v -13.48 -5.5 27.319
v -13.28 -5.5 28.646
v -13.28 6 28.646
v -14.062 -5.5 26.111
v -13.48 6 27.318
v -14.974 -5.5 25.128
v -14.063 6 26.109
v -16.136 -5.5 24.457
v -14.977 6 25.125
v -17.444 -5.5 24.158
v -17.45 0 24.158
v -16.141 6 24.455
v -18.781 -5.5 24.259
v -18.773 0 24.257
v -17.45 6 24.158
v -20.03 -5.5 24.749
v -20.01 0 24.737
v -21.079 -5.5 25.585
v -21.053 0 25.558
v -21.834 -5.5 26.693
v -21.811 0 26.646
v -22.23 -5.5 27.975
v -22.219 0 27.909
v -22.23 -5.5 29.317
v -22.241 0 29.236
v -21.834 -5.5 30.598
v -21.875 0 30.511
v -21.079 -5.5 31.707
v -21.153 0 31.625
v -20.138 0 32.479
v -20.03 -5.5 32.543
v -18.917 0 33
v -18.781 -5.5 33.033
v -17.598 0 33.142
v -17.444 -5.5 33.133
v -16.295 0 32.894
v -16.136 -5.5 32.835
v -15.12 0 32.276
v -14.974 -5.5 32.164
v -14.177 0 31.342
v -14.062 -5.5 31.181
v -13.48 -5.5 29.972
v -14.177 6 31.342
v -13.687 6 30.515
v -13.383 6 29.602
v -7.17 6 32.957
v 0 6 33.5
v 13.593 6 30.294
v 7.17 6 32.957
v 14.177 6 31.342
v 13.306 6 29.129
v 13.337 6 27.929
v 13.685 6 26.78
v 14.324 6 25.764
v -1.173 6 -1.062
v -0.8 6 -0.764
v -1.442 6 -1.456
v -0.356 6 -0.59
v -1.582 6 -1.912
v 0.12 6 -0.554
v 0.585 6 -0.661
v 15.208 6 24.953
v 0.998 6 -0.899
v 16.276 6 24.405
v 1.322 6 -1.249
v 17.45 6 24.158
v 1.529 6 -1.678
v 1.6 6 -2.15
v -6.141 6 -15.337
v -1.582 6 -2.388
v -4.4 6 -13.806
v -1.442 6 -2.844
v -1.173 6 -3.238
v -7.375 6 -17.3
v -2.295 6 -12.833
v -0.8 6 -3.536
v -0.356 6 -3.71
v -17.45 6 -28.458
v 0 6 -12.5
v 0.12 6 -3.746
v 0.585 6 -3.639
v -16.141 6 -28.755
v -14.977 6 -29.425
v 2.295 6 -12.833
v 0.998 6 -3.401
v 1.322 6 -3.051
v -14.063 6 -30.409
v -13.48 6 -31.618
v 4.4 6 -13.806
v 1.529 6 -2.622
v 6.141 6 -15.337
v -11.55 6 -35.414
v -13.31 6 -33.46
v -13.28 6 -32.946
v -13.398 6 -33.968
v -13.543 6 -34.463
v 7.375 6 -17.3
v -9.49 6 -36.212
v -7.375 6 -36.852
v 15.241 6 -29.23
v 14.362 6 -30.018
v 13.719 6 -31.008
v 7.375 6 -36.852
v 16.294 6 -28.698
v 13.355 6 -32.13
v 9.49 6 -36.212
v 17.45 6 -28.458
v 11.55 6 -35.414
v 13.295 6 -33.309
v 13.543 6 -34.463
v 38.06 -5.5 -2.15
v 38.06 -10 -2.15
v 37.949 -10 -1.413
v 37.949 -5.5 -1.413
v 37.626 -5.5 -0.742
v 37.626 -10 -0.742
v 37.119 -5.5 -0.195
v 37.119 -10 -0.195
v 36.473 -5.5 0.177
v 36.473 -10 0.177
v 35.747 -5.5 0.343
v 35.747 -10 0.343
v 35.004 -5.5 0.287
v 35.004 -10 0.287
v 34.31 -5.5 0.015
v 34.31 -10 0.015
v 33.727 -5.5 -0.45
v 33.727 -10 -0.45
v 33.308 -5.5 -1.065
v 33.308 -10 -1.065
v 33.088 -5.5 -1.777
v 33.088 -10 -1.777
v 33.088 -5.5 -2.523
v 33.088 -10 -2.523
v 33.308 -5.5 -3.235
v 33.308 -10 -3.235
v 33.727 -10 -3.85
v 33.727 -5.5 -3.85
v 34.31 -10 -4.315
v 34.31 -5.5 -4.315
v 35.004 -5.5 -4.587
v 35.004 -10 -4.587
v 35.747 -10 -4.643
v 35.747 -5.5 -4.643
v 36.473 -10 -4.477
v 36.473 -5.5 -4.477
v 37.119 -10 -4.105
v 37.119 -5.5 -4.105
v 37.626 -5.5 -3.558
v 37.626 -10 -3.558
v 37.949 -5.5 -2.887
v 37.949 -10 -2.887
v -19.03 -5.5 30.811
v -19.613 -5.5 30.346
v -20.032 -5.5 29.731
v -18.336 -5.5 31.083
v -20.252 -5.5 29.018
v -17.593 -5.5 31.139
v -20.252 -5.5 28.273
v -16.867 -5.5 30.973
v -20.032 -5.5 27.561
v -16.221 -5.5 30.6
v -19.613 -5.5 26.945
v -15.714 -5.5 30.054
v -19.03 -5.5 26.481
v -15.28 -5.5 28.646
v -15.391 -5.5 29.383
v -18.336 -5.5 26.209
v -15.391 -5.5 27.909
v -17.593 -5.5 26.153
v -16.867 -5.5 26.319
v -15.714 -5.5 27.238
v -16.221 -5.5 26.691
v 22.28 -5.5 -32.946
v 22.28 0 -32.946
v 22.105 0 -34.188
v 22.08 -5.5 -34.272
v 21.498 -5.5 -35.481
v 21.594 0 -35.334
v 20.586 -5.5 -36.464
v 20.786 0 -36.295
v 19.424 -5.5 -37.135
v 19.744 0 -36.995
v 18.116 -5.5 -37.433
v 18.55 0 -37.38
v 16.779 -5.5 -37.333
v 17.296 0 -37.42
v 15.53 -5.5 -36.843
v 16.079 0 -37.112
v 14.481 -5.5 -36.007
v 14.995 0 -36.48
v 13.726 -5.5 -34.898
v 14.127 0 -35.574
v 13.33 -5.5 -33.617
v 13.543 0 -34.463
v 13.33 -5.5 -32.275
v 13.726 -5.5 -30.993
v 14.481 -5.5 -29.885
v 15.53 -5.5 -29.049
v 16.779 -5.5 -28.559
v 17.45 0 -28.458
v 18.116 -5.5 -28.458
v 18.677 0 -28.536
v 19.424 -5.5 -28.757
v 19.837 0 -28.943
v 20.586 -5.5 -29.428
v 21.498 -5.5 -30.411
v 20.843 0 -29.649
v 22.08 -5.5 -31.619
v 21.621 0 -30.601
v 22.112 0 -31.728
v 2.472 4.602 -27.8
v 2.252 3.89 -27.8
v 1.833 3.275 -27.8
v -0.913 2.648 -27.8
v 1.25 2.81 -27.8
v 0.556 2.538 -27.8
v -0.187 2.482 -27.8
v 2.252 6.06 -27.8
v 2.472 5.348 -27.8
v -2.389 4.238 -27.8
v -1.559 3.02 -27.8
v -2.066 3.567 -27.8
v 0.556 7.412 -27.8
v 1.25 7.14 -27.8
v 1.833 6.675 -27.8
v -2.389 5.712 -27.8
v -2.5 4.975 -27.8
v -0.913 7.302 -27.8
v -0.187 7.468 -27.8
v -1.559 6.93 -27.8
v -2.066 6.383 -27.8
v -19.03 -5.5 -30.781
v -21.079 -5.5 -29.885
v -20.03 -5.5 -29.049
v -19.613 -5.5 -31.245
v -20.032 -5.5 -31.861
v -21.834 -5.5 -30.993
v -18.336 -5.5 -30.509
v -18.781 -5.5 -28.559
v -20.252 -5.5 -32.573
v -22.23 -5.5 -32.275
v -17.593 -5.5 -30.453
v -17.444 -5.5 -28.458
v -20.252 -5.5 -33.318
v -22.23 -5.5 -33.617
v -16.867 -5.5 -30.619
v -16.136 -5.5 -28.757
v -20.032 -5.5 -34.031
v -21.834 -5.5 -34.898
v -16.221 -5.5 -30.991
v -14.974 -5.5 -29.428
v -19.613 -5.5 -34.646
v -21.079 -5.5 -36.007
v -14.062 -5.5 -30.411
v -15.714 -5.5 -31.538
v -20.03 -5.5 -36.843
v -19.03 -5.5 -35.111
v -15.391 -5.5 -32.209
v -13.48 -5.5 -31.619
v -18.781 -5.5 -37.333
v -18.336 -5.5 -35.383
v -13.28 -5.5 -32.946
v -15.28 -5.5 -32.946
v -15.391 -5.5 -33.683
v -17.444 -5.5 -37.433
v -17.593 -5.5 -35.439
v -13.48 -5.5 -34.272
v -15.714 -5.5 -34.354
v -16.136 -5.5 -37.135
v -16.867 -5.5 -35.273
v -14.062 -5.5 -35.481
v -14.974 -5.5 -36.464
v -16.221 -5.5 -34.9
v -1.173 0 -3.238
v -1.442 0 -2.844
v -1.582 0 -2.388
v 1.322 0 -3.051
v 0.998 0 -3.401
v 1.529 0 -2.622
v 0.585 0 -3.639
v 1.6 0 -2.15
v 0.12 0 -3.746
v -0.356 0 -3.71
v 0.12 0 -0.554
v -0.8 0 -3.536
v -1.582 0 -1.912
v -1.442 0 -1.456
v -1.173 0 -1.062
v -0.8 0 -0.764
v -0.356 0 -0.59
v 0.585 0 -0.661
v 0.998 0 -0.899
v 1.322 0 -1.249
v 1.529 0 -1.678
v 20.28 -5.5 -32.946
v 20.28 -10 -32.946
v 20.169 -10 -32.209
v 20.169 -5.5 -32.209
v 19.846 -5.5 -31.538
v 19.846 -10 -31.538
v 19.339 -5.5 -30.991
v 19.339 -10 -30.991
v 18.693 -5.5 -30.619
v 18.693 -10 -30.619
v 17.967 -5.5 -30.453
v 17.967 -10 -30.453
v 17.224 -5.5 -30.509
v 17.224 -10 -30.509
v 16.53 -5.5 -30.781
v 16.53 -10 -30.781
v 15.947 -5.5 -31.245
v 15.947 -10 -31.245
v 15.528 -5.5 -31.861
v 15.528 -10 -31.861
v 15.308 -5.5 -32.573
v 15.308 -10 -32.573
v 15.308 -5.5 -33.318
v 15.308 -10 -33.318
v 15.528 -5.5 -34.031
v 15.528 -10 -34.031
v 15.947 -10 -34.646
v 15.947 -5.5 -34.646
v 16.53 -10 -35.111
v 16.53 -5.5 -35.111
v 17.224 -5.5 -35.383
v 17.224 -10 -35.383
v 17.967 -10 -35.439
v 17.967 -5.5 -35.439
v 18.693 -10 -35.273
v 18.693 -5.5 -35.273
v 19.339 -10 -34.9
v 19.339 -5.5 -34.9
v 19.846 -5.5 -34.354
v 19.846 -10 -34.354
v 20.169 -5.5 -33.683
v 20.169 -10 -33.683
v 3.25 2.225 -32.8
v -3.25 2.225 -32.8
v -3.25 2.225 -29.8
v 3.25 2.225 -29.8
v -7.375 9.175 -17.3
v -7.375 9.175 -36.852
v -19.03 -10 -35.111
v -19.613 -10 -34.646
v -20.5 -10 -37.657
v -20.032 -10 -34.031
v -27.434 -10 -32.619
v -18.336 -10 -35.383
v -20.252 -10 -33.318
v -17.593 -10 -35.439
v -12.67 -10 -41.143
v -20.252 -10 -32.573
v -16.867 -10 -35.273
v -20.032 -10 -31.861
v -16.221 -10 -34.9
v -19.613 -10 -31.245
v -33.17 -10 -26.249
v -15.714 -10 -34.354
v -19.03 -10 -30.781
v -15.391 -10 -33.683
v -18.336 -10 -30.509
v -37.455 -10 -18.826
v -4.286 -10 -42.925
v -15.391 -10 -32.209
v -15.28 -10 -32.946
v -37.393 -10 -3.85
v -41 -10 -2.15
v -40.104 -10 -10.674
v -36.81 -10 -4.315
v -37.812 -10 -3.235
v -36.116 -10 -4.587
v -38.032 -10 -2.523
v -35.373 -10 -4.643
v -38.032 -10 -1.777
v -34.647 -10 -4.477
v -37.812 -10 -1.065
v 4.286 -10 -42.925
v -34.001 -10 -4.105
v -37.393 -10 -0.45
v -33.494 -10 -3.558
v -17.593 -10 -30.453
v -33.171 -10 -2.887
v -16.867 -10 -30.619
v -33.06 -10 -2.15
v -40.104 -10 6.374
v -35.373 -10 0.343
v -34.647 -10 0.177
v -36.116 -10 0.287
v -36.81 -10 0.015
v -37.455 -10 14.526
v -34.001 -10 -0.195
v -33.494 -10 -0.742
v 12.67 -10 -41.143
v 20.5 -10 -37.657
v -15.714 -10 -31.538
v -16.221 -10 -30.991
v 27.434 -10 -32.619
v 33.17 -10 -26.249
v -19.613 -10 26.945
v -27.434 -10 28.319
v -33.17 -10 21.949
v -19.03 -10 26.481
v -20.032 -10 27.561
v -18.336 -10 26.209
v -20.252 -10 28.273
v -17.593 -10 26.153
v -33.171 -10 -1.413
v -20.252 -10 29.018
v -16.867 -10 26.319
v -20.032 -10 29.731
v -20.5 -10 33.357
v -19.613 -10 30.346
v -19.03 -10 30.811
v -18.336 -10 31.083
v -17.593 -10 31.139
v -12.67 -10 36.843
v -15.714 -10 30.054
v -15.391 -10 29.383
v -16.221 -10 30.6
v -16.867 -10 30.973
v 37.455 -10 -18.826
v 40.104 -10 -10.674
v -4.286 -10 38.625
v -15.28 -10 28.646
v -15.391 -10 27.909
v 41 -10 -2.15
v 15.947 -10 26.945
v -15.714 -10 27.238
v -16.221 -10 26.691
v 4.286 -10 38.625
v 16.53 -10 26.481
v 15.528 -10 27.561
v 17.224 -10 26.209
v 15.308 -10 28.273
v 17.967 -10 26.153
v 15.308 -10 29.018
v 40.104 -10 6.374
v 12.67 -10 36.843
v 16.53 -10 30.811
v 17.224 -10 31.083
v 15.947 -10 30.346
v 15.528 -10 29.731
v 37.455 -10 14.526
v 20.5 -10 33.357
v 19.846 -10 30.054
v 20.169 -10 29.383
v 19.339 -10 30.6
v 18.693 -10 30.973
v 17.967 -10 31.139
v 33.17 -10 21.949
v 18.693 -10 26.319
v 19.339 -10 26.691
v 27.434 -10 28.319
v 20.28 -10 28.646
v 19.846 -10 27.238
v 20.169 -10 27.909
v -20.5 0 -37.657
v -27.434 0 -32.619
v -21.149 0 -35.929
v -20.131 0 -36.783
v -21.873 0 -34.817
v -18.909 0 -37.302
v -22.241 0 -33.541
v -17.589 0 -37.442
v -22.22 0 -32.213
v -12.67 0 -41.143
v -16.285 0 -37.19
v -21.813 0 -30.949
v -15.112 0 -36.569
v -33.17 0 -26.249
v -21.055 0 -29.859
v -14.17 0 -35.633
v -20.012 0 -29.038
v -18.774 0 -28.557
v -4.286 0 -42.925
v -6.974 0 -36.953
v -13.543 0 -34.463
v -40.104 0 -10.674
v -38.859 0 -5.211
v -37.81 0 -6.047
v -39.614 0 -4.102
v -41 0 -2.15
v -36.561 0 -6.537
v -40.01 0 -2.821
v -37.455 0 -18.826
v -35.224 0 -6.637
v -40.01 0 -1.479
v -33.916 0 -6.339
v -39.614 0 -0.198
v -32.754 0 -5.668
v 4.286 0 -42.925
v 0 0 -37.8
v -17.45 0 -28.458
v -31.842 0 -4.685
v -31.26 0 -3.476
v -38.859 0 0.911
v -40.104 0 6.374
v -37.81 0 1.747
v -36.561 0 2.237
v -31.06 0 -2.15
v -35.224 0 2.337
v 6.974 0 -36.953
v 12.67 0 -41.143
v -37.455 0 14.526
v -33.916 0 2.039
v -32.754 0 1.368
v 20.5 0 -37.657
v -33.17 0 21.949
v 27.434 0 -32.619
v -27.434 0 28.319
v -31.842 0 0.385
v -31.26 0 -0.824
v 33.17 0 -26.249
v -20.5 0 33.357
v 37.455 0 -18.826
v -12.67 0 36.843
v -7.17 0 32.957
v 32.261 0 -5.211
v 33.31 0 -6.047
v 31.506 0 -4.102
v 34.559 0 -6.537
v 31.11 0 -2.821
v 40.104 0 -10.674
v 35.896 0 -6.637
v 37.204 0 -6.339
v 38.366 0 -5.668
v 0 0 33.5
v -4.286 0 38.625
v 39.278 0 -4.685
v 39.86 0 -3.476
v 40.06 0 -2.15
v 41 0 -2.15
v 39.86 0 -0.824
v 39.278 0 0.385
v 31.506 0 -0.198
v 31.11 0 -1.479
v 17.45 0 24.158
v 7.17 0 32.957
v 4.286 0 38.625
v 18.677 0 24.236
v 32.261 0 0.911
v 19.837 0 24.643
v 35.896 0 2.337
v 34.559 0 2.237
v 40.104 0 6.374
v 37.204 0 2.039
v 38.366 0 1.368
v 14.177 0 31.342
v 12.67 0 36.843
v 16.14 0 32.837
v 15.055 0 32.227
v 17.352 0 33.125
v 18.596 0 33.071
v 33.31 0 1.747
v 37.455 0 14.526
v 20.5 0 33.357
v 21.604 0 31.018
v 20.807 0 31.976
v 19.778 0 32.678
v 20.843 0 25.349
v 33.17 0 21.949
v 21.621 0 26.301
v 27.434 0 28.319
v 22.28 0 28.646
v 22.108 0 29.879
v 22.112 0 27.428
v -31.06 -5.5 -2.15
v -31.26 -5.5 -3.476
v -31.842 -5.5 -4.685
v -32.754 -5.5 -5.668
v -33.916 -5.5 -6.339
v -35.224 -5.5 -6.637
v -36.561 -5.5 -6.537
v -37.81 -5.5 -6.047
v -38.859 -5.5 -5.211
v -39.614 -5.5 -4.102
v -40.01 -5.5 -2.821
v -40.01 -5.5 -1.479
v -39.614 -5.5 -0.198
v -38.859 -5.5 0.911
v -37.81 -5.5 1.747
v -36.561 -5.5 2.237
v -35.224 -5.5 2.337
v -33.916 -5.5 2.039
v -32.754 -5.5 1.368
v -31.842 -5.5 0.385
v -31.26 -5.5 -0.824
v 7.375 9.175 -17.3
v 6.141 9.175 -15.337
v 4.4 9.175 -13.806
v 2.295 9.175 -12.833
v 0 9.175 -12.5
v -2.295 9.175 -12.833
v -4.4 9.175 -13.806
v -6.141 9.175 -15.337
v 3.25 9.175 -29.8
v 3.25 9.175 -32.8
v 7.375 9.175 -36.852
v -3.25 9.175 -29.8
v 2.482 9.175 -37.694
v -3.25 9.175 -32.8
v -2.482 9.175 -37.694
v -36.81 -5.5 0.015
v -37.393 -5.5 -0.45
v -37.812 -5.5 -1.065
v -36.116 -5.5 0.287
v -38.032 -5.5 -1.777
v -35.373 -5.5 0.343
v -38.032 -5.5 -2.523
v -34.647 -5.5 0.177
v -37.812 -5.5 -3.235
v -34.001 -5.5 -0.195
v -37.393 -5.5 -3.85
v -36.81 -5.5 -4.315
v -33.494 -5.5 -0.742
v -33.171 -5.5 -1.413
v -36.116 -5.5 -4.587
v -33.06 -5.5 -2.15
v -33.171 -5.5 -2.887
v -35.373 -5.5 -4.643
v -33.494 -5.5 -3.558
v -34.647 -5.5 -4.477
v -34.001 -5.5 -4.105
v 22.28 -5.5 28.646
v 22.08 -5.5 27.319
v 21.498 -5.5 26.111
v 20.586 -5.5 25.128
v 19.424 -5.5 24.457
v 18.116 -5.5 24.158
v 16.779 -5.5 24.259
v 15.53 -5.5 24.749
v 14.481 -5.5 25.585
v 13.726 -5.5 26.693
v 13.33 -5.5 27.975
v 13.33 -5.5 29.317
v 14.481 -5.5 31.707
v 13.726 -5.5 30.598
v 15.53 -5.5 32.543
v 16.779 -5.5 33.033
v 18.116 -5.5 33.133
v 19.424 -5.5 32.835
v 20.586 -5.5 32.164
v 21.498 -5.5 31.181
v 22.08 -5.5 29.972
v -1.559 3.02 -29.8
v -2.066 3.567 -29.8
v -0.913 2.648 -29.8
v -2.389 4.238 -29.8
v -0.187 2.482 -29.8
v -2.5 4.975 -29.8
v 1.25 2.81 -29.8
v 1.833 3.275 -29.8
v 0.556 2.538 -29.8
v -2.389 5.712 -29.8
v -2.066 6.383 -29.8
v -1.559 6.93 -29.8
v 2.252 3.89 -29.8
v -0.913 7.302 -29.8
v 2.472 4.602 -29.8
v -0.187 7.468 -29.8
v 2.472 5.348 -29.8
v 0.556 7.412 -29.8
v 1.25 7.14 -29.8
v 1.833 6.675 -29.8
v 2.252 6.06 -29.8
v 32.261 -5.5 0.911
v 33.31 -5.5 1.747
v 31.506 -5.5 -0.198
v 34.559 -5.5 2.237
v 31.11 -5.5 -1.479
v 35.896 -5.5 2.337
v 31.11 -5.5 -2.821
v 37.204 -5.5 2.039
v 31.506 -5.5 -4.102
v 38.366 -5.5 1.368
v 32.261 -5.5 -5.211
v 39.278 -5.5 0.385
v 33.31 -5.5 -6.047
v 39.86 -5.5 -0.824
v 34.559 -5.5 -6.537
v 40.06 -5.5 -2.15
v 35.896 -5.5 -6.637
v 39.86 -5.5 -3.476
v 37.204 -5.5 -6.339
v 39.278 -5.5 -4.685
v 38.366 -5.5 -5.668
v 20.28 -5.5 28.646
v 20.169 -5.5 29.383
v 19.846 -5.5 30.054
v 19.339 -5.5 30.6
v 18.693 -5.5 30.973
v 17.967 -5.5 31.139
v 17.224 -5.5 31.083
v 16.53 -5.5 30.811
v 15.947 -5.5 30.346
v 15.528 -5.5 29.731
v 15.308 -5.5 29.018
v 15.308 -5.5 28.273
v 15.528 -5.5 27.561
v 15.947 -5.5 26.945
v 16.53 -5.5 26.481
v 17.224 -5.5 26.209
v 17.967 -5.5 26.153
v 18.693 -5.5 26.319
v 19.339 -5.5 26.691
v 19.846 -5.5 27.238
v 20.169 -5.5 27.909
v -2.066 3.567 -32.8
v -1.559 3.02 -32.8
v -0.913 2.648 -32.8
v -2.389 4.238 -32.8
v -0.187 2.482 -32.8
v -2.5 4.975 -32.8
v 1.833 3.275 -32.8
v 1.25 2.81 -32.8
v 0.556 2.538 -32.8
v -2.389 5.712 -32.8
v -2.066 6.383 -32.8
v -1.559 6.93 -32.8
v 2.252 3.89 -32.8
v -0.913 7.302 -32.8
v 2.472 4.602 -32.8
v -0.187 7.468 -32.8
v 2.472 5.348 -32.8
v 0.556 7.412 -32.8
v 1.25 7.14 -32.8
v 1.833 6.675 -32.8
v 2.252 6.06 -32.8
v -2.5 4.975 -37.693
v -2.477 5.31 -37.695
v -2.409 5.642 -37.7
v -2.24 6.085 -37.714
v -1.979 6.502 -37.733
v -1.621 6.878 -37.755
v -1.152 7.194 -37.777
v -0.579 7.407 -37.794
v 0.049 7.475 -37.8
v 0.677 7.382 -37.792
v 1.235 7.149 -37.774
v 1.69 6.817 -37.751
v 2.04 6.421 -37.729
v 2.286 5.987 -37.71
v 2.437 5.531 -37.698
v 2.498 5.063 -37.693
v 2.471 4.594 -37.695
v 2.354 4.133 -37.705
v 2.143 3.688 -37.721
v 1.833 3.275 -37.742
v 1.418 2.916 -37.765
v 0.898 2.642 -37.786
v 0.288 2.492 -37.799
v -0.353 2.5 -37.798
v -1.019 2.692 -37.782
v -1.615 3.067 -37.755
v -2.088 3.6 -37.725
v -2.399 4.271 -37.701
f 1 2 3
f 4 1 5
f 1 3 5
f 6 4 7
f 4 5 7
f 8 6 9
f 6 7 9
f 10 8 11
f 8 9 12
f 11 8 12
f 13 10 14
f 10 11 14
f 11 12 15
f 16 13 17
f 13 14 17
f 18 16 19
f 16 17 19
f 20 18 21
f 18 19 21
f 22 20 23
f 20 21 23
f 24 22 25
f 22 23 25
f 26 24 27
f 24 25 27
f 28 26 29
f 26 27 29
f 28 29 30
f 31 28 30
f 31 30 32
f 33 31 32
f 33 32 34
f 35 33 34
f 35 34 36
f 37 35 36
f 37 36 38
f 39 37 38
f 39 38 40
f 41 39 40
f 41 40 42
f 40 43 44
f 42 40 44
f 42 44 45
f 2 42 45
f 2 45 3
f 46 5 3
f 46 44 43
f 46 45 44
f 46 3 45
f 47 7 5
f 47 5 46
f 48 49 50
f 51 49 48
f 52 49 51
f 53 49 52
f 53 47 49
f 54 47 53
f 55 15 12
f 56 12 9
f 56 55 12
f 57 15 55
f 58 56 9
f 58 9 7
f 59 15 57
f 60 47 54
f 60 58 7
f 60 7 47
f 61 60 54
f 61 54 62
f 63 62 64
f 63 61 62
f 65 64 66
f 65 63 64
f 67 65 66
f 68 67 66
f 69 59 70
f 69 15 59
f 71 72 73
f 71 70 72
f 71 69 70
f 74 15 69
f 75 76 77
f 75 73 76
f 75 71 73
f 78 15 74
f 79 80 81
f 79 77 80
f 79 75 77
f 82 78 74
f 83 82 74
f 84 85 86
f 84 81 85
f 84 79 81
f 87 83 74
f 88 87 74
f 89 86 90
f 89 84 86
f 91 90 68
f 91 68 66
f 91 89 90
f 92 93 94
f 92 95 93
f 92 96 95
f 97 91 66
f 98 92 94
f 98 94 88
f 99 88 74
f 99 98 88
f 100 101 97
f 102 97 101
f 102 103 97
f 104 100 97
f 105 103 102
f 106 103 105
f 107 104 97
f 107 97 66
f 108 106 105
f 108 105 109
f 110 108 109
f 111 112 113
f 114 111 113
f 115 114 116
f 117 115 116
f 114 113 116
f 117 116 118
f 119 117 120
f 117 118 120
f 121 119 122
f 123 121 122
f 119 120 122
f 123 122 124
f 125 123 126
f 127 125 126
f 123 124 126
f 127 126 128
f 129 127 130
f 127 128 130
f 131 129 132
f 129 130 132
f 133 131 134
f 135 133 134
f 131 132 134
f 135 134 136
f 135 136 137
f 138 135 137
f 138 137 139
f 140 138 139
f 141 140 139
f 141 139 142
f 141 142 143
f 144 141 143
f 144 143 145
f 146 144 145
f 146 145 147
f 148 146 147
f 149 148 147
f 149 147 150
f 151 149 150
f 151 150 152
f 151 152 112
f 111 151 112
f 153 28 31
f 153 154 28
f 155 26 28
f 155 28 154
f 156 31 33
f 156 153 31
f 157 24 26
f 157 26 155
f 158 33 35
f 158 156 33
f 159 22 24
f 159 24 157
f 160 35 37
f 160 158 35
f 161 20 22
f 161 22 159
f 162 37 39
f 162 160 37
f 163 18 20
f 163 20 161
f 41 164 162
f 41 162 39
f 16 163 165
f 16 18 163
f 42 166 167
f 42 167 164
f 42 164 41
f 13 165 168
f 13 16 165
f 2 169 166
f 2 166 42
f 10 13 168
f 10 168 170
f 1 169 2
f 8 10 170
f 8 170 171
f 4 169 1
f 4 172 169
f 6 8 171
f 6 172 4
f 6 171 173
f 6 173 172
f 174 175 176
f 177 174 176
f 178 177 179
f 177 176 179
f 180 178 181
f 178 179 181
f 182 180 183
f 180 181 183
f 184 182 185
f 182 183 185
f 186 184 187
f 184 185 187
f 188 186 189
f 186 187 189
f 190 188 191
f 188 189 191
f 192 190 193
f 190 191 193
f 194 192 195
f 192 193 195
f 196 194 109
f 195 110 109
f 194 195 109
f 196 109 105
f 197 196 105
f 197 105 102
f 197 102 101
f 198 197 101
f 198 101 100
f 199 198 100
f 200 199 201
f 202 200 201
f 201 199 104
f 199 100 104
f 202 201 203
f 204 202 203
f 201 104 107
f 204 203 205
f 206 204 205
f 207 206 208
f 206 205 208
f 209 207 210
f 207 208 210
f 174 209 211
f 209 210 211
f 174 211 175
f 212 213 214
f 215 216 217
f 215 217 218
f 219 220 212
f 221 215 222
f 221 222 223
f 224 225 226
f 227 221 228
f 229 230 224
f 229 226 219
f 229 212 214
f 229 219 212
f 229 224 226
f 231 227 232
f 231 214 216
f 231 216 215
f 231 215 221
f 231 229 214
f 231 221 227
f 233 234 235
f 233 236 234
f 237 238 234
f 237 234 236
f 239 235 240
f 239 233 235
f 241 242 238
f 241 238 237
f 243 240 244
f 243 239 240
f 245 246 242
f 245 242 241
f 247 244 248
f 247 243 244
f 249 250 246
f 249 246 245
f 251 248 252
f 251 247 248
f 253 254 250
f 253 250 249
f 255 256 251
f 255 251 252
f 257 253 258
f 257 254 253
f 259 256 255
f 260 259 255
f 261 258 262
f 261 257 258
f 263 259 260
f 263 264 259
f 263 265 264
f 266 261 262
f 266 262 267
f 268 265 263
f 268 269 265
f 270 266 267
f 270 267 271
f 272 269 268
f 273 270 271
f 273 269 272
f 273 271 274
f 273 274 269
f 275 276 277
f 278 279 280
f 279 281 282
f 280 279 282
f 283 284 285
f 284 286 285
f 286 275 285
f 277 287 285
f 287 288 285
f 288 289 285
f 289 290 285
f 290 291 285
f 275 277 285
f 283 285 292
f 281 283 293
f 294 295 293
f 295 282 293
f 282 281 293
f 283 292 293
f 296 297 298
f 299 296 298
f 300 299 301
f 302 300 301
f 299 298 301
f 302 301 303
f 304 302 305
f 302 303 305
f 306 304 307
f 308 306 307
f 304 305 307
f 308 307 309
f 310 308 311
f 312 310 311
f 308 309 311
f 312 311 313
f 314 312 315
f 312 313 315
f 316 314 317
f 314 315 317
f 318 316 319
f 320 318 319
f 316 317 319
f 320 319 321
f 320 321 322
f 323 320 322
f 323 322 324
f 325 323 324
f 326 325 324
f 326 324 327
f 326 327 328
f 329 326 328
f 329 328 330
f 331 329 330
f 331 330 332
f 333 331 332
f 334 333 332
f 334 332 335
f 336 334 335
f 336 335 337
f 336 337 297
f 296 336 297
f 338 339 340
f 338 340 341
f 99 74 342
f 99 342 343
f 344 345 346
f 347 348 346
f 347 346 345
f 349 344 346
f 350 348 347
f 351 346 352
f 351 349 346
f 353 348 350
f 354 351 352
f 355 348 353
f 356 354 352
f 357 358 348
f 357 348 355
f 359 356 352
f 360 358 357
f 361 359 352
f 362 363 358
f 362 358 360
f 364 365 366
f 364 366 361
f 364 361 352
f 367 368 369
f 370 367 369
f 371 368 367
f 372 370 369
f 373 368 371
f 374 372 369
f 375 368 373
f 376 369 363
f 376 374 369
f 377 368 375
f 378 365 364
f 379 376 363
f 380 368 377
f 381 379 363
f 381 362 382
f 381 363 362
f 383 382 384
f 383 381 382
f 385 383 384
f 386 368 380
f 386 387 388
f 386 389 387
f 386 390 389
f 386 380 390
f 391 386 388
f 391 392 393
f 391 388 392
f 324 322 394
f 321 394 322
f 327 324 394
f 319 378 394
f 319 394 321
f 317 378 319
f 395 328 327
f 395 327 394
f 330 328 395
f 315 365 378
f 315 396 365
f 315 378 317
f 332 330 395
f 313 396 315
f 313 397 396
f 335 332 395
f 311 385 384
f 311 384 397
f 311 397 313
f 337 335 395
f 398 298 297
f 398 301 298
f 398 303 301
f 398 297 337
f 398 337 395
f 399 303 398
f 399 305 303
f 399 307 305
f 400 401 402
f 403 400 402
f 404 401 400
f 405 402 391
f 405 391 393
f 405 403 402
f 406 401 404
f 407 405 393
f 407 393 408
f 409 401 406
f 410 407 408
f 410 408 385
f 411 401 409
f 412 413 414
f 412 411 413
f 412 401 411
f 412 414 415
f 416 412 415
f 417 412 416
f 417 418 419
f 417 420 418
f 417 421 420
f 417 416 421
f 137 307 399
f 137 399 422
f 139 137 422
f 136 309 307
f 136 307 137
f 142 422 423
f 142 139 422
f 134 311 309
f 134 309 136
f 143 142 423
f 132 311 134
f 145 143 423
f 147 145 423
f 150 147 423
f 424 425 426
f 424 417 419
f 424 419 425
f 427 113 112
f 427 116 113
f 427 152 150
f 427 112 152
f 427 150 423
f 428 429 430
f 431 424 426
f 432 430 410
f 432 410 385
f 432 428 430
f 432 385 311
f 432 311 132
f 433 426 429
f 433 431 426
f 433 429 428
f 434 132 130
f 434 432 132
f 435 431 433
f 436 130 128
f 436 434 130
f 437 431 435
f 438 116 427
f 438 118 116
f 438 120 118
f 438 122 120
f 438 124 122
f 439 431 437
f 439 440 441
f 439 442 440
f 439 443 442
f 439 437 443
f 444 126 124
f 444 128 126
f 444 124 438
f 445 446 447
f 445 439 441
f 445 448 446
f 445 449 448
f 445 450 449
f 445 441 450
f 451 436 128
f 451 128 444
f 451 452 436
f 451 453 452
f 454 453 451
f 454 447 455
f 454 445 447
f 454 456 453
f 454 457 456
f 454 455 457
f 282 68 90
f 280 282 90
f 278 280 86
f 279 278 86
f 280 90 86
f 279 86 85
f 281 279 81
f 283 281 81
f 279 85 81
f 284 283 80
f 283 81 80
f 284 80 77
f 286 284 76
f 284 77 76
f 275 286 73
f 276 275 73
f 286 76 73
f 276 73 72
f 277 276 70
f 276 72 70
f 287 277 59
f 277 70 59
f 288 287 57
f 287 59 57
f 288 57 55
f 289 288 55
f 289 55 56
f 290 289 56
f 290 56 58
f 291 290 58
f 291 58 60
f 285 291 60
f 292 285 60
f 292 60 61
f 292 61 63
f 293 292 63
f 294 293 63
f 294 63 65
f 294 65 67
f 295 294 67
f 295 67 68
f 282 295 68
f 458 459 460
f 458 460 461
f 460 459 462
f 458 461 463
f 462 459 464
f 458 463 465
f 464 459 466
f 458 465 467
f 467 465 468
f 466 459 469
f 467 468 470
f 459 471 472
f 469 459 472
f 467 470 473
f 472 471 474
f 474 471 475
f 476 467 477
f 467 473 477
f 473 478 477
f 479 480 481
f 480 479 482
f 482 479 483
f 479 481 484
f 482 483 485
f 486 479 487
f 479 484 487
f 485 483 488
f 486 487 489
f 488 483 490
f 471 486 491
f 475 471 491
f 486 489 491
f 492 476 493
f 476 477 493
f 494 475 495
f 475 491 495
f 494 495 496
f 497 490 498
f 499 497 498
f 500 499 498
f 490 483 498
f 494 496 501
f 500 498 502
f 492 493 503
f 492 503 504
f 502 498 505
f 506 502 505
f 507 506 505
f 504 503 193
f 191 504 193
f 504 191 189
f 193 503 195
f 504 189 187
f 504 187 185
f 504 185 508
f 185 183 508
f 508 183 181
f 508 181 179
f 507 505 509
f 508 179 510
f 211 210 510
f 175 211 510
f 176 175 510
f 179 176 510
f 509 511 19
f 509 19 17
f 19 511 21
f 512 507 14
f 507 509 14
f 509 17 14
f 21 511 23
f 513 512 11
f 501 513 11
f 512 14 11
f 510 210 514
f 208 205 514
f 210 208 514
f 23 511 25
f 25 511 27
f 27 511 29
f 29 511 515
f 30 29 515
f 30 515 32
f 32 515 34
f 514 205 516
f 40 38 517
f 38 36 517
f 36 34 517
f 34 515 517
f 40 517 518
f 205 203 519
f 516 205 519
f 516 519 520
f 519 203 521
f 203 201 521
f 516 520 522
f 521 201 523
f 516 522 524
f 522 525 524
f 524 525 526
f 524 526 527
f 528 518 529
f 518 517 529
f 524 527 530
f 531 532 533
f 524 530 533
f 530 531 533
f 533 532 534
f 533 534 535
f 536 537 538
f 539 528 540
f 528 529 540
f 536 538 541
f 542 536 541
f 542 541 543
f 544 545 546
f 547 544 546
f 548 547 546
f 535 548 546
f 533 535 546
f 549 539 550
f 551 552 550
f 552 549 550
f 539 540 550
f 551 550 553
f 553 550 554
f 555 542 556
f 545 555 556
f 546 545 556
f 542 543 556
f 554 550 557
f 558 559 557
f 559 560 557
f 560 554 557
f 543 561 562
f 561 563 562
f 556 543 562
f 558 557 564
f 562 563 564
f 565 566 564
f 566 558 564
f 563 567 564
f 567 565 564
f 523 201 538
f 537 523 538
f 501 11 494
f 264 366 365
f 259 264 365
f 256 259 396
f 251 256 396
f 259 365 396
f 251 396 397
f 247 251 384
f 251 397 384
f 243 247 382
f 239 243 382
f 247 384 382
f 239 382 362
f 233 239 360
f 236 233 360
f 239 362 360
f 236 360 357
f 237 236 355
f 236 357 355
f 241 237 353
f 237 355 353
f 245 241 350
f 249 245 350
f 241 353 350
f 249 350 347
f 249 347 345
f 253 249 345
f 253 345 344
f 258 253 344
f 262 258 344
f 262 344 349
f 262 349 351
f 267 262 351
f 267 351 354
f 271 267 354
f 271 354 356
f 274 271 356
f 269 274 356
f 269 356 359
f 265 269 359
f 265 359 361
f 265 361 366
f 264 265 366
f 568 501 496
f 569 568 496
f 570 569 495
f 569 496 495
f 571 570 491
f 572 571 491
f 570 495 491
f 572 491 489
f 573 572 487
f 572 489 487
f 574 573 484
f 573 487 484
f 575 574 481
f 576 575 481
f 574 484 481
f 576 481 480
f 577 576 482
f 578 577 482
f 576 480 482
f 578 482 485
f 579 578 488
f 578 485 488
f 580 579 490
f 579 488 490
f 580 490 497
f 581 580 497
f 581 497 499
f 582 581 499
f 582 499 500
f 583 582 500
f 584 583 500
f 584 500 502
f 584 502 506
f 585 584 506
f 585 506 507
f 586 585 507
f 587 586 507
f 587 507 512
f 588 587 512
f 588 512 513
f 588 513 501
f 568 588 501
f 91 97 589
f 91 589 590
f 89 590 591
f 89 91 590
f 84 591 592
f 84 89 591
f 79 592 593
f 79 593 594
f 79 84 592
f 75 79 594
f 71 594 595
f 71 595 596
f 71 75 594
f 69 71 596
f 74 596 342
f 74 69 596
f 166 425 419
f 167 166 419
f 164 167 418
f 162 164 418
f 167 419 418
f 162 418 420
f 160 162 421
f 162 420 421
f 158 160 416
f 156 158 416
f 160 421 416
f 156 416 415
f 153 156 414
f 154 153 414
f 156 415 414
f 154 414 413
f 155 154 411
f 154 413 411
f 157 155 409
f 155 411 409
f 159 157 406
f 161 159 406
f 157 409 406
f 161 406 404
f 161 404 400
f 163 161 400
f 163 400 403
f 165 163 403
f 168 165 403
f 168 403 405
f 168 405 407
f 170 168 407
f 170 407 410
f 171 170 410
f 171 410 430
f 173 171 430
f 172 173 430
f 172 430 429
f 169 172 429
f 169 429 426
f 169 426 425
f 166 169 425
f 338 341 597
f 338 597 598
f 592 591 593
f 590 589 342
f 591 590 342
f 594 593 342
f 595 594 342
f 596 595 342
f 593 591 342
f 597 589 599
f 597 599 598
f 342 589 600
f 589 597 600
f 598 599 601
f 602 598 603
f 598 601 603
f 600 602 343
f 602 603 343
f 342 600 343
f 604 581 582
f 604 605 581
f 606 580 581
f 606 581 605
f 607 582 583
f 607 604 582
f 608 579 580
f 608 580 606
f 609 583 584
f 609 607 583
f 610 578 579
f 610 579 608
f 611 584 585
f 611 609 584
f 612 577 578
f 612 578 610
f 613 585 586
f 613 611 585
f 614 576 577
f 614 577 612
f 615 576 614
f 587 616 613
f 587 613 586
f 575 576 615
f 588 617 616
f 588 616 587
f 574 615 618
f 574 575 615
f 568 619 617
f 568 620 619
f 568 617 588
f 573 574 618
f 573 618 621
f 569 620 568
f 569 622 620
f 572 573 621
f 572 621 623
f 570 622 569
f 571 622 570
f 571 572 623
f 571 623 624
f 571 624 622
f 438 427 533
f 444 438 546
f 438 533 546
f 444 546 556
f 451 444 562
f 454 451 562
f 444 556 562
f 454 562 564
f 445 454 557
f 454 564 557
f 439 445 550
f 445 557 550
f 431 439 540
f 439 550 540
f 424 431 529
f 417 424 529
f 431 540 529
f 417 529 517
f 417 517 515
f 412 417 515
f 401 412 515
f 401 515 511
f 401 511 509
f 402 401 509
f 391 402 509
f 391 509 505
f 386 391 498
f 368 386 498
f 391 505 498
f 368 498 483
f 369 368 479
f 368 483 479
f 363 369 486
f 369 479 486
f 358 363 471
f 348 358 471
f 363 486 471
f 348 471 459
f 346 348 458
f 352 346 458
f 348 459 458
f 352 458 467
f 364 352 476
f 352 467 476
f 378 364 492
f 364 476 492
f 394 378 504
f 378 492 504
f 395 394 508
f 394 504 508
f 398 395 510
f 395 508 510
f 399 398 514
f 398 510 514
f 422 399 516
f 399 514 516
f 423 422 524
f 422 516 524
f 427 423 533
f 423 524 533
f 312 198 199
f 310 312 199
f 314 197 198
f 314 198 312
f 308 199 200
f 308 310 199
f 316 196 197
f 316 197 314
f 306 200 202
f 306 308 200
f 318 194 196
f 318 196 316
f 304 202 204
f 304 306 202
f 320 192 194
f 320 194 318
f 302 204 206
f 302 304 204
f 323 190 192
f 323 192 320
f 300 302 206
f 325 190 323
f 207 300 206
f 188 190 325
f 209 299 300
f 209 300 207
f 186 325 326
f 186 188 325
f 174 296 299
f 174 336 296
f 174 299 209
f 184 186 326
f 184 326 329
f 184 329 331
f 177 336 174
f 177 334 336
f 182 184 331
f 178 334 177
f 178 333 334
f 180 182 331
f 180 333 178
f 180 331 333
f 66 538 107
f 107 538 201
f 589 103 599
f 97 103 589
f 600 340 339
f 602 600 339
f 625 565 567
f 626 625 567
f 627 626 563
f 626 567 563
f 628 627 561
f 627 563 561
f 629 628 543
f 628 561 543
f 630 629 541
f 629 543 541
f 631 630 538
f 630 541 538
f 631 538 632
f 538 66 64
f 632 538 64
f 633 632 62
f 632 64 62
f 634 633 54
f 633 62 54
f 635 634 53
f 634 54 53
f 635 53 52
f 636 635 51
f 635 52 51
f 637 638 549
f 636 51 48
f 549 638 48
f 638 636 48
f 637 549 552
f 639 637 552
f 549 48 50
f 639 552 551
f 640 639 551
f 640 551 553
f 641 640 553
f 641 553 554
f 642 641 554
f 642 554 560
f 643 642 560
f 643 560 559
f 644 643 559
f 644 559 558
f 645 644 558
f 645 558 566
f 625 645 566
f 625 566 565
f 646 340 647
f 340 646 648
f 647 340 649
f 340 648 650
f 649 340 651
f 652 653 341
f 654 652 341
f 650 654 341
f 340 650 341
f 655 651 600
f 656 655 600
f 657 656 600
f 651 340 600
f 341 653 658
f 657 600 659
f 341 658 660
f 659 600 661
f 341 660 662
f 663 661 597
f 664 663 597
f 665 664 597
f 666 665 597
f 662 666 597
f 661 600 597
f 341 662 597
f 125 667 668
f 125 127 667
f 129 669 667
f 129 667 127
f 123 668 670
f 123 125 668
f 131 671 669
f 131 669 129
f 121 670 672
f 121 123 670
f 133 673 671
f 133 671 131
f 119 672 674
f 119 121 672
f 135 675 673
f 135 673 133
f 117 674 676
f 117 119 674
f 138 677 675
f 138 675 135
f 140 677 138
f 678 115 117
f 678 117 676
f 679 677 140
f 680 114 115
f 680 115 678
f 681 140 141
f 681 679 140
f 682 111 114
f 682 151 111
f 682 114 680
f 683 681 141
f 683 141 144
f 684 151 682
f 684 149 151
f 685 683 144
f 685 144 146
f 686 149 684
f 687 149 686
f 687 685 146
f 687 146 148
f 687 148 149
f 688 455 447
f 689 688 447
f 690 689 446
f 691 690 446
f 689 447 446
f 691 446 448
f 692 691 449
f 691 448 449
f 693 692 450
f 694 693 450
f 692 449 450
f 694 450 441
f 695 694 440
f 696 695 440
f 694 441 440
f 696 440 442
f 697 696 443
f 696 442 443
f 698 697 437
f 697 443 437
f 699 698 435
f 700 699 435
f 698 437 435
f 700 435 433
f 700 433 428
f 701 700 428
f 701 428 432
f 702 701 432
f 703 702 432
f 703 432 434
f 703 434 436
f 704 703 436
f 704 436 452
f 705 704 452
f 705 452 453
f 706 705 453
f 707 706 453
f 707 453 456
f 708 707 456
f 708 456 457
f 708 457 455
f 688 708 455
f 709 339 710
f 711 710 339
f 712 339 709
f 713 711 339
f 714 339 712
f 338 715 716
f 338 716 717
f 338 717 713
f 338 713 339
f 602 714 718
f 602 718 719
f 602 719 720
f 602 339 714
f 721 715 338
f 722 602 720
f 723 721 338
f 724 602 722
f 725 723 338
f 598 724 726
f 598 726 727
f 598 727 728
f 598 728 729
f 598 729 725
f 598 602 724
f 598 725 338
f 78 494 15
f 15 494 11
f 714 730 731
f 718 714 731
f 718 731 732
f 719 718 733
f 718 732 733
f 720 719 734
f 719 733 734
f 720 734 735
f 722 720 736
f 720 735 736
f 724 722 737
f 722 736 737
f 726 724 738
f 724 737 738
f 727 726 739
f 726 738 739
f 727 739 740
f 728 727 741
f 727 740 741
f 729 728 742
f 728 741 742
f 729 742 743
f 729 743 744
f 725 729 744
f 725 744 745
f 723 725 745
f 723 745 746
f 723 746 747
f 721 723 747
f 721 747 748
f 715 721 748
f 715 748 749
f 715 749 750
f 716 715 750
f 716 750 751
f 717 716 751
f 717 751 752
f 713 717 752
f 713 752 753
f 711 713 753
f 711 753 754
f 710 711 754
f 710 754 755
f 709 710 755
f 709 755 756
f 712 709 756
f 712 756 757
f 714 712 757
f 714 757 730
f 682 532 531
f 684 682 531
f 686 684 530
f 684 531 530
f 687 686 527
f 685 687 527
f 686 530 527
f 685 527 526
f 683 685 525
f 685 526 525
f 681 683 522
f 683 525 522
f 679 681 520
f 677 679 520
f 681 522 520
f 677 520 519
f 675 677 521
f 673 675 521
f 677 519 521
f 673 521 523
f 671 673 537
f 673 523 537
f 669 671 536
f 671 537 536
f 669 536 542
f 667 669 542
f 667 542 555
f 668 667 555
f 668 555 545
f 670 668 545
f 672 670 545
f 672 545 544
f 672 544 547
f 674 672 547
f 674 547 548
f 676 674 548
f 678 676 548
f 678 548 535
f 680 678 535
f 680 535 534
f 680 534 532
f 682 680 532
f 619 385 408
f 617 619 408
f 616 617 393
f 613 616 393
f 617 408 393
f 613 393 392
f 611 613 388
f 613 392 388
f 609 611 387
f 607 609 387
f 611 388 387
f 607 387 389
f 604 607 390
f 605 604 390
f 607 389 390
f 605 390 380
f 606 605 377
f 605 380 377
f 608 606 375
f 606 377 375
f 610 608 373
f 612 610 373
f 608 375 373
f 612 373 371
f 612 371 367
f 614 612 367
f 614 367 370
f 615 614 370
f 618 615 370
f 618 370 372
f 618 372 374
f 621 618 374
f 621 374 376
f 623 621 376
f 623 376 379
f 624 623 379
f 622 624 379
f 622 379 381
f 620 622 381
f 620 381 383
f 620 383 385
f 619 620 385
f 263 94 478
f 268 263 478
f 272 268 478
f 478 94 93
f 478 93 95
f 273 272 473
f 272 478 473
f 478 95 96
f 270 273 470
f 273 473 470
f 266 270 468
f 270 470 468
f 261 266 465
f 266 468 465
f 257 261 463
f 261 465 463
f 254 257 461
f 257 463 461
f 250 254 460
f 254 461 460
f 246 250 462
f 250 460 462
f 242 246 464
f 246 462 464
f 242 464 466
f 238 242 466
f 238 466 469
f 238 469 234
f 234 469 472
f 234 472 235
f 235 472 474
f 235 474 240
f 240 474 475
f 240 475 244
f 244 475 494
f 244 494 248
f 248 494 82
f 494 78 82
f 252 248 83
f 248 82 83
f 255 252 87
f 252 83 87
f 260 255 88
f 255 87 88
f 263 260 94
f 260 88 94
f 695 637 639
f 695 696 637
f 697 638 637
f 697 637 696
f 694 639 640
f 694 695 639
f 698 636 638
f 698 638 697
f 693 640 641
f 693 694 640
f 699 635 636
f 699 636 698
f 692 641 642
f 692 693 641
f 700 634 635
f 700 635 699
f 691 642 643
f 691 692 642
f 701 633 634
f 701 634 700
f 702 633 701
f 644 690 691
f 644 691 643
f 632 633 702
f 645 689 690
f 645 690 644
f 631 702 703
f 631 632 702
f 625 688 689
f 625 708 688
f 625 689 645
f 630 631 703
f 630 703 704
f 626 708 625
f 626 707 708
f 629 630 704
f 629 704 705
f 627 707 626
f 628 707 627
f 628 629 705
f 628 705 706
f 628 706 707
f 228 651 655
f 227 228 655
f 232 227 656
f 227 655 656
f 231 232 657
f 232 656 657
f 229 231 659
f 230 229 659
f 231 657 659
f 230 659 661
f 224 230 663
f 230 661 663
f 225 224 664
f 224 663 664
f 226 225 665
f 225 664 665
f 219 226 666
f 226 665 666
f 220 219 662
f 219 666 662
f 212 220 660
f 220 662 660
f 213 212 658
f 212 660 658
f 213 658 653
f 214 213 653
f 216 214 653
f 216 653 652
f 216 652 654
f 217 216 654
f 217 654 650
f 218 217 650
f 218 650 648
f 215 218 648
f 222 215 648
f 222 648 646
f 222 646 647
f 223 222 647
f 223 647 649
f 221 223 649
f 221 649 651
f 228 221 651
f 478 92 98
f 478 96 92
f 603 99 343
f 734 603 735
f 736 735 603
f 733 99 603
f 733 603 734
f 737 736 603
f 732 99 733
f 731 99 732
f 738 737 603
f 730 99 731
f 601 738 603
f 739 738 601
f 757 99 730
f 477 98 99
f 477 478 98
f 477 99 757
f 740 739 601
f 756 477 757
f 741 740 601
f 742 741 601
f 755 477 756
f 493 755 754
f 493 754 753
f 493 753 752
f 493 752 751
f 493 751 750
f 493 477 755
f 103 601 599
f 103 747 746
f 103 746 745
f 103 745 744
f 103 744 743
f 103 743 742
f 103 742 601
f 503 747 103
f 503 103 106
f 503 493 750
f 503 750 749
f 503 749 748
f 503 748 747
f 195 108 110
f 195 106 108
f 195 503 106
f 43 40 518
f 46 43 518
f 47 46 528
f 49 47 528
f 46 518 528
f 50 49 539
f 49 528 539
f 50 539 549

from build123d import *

# Parameters (mm, degrees)
BOSS_EXTRUDE1_DEPTH  = 6
SKETCH3_W            = 26.265732208
SKETCH3_H            = 53.5
CUT_EXTRUDE2_DEPTH   = 6
BOSS_EXTRUDE2_DEPTH  = 3.175
CUT_EXTRUDE3_DEPTH   = 9.175
SKETCH5_W            = 6.5
SKETCH5_H            = 3
CUT_EXTRUDE4_DEPTH   = 6.95
SKETCH6_R            = 2.5
CUT_EXTRUDE5_DEPTH   = 10
M3_CLEARANCE_HOLE1_D = 3.2
SKETCH17_R           = 41
BOSS_EXTRUDE3_DEPTH  = 10
SKETCH18_R           = 2.5
CUT_EXTRUDE6_DEPTH   = 5
SKETCH19_R           = 4.5
CUT_EXTRUDE7_DEPTH   = 11.5
SKETCH20_R           = 2.706261539
SKETCH20_R_2         = 3.316969597
CUT_EXTRUDE8_DEPTH   = 6


with BuildPart() as part:
    # Sketch1 → Boss-Extrude1 (new body)
    with BuildSketch(Plane(origin=(0, 0, 0), x_dir=(1, 0, 0), z_dir=(0, 1, 0))):
        with BuildLine():
            Line((-21.25, 28.5), (-21.25, -28.5))
            ThreePointArc((-21.25, -28.5), (0, -33.5), (21.25, -28.5))
            Line((21.25, -28.5), (21.25, 28.5))
            Line((21.25, 28.5), (-21.25, 28.5))
        make_face()
        with BuildLine():
            Line((-17.45, 32), (-17.45, 28.5))
            Line((-17.45, 28.5), (17.45, 28.5))
            Line((17.45, 28.5), (17.45, 32))
            ThreePointArc((17.45, 32), (0, 37.8), (-17.45, 32))
        make_face()
    extrude(amount=BOSS_EXTRUDE1_DEPTH)

    # Sketch3 → Cut-Extrude2 (cut)
    with BuildSketch(Plane.XZ):
        with Locations((-30.582866104, -1.75)):
            Rectangle(SKETCH3_W, SKETCH3_H)
        with Locations((30.582866104, -1.75)):
            Rectangle(SKETCH3_W, SKETCH3_H)
    extrude(amount=-CUT_EXTRUDE2_DEPTH, mode=Mode.SUBTRACT)

    # Sketch2 → Boss-Extrude2 (add)
    with BuildSketch(Plane(origin=(0, 6, 0), x_dir=(1, 0, 0), z_dir=(0, 1, 0))):
        with BuildLine():
            Line((-7.375, 17.3), (-7.375, 37.8))
            Line((-7.375, 37.8), (7.375, 37.8))
            Line((7.375, 37.8), (7.375, 17.3))
            ThreePointArc((7.375, 17.3), (0, 12.5), (-7.375, 17.3))
        make_face()
    extrude(amount=BOSS_EXTRUDE2_DEPTH)

    # Sketch4 → Cut-Extrude3 (cut)
    with BuildSketch(Plane.XZ):
        with BuildLine():
            Line((17.45, -32), (17.45, -50.042511561))
            Line((17.45, -50.042511561), (-17.45, -50.042511561))
            Line((-17.45, -50.042511561), (-17.45, -32))
            ThreePointArc((-17.45, -32), (0, -37.8), (17.45, -32))
        make_face()
    extrude(amount=-CUT_EXTRUDE3_DEPTH, mode=Mode.SUBTRACT)

    # Sketch5 → Cut-Extrude4 (cut)
    with BuildSketch(Plane(origin=(0, 9.175, 0), x_dir=(1, 0, 0), z_dir=(0, 1, 0))):
        with Locations((0, 31.3)):
            Rectangle(SKETCH5_W, SKETCH5_H)
    extrude(amount=-CUT_EXTRUDE4_DEPTH, mode=Mode.SUBTRACT)

    # Sketch6 → Cut-Extrude5 (cut)
    with BuildSketch(Plane(origin=(0, 9.175, -37.8), x_dir=(-1, 0, 0), z_dir=(0, 0, -1))):
        with Locations((0, -4.2)):
            Circle(SKETCH6_R)
    extrude(amount=-CUT_EXTRUDE5_DEPTH, mode=Mode.SUBTRACT)

    # M3 Clearance Hole1 (through all)
    with Locations(Plane(origin=(0, 0, 0), x_dir=(-1, 0, 0), z_dir=(0, -1, 0))):
        with Locations((0, 2.15)):
            Hole(M3_CLEARANCE_HOLE1_D / 2)

    # Sketch17 → Boss-Extrude3 (add)
    with BuildSketch(Plane.XZ):
        with Locations((0, -2.15)):
            Circle(SKETCH17_R)
    extrude(amount=BOSS_EXTRUDE3_DEPTH)

    # Sketch18 → Cut-Extrude6 (cut)
    with BuildSketch(Plane.XZ.offset(10)):
        with Locations((17.78, -32.945863359)):
            Circle(SKETCH18_R)
        with Locations((35.56, -2.15)):
            Circle(SKETCH18_R)
        with Locations((17.78, 28.645863359)):
            Circle(SKETCH18_R)
        with Locations((-17.78, -32.945863359)):
            Circle(SKETCH18_R)
        with Locations((-35.56, -2.15)):
            Circle(SKETCH18_R)
        with Locations((-17.78, 28.645863359)):
            Circle(SKETCH18_R)
    extrude(amount=-CUT_EXTRUDE6_DEPTH, mode=Mode.SUBTRACT)

    # Sketch19 → Cut-Extrude7 (cut)
    with BuildSketch(Plane(origin=(0, 6, 0), x_dir=(1, 0, 0), z_dir=(0, 1, 0))):
        with Locations((-17.78, 32.945863359)):
            Circle(SKETCH19_R)
        with Locations((17.78, 32.945863359)):
            Circle(SKETCH19_R)
        with Locations((35.56, 2.15)):
            Circle(SKETCH19_R)
        with Locations((17.78, -28.645863359)):
            Circle(SKETCH19_R)
        with Locations((-17.78, -28.645863359)):
            Circle(SKETCH19_R)
        with Locations((-35.56, 2.15)):
            Circle(SKETCH19_R)
    extrude(amount=-CUT_EXTRUDE7_DEPTH, mode=Mode.SUBTRACT)

    # Sketch20 → Cut-Extrude8 (cut)
    with BuildSketch(Plane(origin=(0, 6, 0), x_dir=(1, 0, 0), z_dir=(0, 1, 0))):
        with Locations((-20.581445068, -26.580263628)):
            Circle(SKETCH20_R)
        with Locations((20.21362745, -26.580263628)):
            Circle(SKETCH20_R_2)
    extrude(amount=-CUT_EXTRUDE8_DEPTH, mode=Mode.SUBTRACT)


solid = part.part
